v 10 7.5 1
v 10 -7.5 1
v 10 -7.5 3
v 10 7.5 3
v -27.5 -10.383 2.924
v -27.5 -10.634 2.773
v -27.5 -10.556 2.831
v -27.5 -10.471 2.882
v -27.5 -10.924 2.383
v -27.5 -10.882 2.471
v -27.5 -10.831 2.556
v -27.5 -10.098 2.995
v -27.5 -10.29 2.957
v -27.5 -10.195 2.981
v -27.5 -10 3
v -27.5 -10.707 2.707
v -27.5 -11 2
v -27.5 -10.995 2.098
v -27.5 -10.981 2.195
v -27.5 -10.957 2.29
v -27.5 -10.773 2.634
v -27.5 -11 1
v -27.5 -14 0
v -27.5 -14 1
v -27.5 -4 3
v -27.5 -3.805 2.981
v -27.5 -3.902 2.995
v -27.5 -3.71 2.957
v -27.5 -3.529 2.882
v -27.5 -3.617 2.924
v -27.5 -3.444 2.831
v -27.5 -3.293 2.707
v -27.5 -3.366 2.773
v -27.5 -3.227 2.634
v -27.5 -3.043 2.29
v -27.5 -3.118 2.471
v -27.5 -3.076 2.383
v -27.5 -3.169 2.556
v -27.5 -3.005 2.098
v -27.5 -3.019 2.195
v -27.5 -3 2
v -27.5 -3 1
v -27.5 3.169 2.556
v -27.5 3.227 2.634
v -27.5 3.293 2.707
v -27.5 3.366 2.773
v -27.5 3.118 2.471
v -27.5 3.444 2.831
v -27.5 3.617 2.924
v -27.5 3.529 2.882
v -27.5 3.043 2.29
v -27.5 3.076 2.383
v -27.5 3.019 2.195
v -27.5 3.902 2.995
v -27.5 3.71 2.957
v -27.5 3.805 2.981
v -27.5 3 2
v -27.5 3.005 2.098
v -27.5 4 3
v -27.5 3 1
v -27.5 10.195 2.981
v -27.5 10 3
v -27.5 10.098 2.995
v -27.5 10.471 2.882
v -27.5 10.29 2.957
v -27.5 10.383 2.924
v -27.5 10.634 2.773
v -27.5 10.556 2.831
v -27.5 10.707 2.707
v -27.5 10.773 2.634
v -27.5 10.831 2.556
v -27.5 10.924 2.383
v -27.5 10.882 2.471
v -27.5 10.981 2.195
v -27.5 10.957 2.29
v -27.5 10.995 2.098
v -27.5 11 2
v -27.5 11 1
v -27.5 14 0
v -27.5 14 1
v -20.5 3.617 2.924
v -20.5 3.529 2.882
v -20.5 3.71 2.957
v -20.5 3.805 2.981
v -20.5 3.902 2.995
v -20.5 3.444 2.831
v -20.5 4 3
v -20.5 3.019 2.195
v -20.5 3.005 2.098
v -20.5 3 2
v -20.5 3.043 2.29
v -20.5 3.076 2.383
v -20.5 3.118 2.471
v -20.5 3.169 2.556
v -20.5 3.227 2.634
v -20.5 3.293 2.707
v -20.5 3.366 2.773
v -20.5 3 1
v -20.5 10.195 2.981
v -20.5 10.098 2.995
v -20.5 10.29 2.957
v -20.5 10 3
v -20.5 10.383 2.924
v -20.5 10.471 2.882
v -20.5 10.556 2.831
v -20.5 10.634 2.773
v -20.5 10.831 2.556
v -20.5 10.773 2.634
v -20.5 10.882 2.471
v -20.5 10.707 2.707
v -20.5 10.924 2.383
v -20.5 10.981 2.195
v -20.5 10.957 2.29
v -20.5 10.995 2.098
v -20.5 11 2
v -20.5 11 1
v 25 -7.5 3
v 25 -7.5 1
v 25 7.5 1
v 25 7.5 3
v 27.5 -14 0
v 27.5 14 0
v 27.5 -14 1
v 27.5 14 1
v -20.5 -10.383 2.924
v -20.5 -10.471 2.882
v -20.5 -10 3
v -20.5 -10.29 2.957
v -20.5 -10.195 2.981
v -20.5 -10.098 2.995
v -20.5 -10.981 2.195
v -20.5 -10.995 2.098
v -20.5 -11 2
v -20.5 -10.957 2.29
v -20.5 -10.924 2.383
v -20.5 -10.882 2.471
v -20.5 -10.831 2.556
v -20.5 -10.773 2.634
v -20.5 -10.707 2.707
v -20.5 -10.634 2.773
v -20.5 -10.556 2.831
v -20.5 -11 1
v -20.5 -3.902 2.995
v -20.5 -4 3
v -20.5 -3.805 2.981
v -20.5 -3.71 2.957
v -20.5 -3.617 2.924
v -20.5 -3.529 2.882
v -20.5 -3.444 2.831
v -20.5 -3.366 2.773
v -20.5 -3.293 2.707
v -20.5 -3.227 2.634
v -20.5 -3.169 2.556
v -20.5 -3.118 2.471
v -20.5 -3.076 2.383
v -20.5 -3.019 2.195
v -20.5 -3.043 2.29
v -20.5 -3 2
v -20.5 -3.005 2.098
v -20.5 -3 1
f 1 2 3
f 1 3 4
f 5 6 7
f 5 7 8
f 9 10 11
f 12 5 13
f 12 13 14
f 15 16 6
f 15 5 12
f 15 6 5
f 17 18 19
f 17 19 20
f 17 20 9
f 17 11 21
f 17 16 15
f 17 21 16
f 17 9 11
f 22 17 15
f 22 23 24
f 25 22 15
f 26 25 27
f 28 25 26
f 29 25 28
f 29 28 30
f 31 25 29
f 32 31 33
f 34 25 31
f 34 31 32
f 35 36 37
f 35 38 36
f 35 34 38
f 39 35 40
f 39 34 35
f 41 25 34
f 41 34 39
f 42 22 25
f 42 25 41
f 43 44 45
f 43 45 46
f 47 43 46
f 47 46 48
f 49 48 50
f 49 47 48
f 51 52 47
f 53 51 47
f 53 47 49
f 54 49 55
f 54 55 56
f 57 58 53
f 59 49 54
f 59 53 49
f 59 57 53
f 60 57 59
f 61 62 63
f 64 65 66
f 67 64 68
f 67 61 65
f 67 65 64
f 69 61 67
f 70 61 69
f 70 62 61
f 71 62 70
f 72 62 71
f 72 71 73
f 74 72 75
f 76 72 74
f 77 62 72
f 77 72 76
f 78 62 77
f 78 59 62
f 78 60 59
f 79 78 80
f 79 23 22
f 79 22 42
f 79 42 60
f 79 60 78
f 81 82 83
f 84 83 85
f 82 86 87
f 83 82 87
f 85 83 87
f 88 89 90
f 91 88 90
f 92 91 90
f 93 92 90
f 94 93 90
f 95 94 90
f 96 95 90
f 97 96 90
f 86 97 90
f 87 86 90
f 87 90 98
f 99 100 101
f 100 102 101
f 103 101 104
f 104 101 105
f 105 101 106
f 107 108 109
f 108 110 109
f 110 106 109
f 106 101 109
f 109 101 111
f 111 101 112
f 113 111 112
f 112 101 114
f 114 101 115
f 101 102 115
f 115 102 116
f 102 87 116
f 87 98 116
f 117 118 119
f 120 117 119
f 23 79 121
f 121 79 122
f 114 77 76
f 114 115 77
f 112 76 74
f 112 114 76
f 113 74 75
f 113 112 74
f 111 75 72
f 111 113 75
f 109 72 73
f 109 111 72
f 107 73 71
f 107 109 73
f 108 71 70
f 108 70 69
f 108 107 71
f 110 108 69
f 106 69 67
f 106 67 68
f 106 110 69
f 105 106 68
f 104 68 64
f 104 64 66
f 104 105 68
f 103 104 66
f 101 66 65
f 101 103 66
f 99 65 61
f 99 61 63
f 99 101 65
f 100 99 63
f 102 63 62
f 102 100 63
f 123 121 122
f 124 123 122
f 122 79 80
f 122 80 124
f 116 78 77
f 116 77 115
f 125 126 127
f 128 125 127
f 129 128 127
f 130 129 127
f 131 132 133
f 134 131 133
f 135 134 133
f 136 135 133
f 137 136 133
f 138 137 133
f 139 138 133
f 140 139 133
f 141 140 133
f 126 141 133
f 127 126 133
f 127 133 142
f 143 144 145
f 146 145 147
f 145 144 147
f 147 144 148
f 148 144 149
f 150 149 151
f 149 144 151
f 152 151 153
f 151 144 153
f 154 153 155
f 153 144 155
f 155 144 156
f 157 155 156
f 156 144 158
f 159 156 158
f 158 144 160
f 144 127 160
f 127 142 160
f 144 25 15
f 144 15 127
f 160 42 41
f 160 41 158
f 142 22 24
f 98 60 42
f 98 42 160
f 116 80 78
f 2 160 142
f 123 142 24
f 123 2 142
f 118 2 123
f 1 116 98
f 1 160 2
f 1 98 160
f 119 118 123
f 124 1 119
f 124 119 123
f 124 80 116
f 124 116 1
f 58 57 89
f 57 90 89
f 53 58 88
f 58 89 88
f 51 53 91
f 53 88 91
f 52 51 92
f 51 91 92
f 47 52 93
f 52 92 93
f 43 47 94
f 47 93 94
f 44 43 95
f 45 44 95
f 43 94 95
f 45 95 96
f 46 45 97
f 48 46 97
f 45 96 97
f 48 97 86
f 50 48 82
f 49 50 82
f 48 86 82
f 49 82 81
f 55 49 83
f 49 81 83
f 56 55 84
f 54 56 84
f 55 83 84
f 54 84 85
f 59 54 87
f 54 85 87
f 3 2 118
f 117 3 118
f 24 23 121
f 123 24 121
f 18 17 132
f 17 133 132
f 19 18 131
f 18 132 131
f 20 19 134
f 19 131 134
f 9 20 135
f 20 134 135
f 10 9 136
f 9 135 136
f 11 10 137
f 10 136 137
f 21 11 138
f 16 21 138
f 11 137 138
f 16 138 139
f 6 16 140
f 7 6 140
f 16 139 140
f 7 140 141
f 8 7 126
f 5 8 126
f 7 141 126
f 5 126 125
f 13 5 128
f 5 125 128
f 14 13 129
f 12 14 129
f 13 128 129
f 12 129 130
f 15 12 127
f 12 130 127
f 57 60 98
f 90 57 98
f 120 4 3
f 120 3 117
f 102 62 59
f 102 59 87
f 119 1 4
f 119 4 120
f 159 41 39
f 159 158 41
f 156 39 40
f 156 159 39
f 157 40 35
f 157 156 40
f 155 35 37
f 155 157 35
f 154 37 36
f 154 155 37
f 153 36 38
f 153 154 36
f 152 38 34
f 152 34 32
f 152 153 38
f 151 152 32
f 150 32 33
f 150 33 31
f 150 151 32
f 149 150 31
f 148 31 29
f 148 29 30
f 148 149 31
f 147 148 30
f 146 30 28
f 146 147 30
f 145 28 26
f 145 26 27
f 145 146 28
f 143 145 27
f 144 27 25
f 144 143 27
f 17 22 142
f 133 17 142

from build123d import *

# Parameters (mm, degrees)
SKETCH_1_W      = 55
SKETCH_1_H      = 28
EXTRUDE_1_DEPTH = 1
SKETCH_2_W      = 15
SKETCH_2_H      = 15
EXTRUDE_2_DEPTH = 2
SKETCH_3_W      = 7
SKETCH_3_H      = 8
EXTRUDE_3_DEPTH = 2
FILLET_1_R      = 1


with BuildPart() as part:
    # 草图1 → 凸台-拉伸1 (new body)
    with BuildSketch(Plane.XY):
        Rectangle(SKETCH_1_W, SKETCH_1_H)
    extrude(amount=EXTRUDE_1_DEPTH)

    # 草图2 → 凸台-拉伸2 (add)
    with BuildSketch(Plane.XY.offset(1)):
        with Locations((17.5, 0)):
            Rectangle(SKETCH_2_W, SKETCH_2_H)
    extrude(amount=EXTRUDE_2_DEPTH)

    # 草图3 → 凸台-拉伸3 (add)
    with BuildSketch(Plane.XY.offset(1)):
        with Locations((-24, -7)):
            Rectangle(SKETCH_3_W, SKETCH_3_H)
        with Locations((-24, 7)):
            Rectangle(SKETCH_3_W, SKETCH_3_H)
    extrude(amount=EXTRUDE_3_DEPTH)

    # 圆角1
    fillet_1_edges = [part.edges().sort_by_distance(p)[0] for p in [
        (-24, 3, 3),
        (-24, 11, 3),
        (-24, -3, 3),
        (-24, -11, 3),
    ]]
    fillet(fillet_1_edges, radius=FILLET_1_R)


solid = part.part
